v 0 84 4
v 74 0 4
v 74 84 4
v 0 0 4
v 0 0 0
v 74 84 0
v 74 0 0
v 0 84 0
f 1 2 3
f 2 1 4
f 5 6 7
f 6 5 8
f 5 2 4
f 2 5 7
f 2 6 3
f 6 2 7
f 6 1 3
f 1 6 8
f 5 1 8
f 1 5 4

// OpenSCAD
/*
    This version for a diagonal split
    This way the deck can stay in the box during gameplay
*/


/*
    Dimensions for objects
    Inner box space
        70mm / 80mm / 100mm
        -> Need half of this vertically
        70 / 80 / 50
        -> Need overlap of 5mmm
        -> Use union to get that
    Shell - total
        4mm / 4mm / 4mm
    Big Sleeve
        3mm / 77mm / 103mm
*/

// Gamma for making things render nicely
y = 0.005;
// Rho for accounting for material expansion
p = 0.2;

// Define inner space
inSpace = [70, 80, 50];

// Define Big Sleeve dimensions
bigSlev = [3, 76, 103];
// Define Big Sleeve edge width
slevEdge = 3;

// Define shell dimensions
oShell = [4, 4, 4];

// Define length of overlap for top/bottom halves
tbO = 5;




/*
    Module to create the bottom half of the box
*/
module bottomDiag() {
    // Union to combine the bottom shell with the deck-holding part
    union() {
        // Makes bottom layer for shell
        cube(oShell + [inSpace[0], inSpace[1], 0]);
        
        
    }
    
}



bottomDiag();
